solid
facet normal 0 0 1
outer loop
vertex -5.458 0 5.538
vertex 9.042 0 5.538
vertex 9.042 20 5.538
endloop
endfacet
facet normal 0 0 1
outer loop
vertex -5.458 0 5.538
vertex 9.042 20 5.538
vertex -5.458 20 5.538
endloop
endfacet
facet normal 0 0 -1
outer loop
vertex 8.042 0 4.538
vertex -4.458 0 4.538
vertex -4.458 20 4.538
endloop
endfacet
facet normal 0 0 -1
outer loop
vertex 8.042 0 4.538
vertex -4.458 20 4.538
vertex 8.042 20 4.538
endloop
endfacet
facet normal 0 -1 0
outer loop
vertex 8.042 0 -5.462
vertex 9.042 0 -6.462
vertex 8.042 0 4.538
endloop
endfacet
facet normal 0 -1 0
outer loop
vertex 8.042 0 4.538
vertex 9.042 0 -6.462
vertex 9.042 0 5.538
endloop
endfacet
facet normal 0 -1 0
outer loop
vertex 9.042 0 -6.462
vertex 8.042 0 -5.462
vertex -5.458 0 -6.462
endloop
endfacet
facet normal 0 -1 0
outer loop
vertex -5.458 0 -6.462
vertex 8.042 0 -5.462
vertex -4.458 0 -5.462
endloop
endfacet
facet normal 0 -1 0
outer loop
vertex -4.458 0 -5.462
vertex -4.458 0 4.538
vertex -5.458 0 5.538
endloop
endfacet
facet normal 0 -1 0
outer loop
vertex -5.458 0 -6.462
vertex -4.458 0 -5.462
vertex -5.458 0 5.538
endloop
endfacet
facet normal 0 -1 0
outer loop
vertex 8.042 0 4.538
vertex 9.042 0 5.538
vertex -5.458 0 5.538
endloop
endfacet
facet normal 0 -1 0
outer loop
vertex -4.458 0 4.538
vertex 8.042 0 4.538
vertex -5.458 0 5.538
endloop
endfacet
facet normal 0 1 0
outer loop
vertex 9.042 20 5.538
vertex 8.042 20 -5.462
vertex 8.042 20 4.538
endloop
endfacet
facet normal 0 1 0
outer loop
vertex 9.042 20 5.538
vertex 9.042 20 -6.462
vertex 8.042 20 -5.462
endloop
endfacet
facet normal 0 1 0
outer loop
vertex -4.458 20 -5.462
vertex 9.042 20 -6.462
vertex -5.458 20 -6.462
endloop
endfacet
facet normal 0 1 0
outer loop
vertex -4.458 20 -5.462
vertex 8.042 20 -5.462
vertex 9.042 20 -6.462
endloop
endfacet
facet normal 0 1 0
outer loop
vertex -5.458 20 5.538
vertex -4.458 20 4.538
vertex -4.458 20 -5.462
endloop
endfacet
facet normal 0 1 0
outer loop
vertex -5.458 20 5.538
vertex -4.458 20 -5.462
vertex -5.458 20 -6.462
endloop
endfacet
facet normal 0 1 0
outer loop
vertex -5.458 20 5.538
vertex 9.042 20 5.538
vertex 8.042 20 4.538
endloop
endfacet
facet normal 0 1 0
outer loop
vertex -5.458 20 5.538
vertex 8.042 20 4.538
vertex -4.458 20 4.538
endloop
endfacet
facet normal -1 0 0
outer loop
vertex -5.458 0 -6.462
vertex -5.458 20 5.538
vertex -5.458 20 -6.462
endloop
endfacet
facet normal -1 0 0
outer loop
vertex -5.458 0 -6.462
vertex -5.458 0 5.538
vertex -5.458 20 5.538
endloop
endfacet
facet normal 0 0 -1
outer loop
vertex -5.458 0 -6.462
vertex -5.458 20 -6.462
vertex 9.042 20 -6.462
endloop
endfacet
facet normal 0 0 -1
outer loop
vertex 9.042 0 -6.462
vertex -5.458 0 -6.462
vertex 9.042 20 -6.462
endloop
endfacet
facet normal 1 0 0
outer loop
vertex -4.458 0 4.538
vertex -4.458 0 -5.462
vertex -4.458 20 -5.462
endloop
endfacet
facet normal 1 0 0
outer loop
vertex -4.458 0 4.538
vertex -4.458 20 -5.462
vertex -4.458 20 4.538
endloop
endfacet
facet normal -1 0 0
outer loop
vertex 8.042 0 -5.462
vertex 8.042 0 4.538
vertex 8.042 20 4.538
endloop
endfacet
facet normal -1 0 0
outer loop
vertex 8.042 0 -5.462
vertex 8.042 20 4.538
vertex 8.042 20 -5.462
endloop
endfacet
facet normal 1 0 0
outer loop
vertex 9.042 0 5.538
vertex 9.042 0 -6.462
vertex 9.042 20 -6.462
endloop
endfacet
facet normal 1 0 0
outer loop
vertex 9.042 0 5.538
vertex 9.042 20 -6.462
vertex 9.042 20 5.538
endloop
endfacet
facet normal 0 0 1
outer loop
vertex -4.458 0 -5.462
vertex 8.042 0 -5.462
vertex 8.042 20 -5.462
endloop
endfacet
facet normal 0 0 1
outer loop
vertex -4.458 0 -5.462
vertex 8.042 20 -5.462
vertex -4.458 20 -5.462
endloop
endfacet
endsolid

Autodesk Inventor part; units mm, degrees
ref_plane "YZ Plane" through (0, 0, 0) normal (1, 0, 0) x (0, 1, 0)
ref_plane "XZ Plane" through (0, 0, 0) normal (0, 1, 0) x (-1, 0, 0)
ref_plane "XY Plane" through (0, 0, 0) normal (0, 0, 1) x (1, 0, 0)
sketch "草圖1" plane through (0, 0, 0) normal (0, 1, 0) x (-1, 0, 0)
  line L0 (4.4578, 4.5382) -> (-8.0422, 4.5382)
  line L1 (-8.0422, 4.5382) -> (-8.0422, -5.4618)
  line L2 (-8.0422, -5.4618) -> (4.4578, -5.4618)
  line L3 (4.4578, -5.4618) -> (4.4578, 4.5382)
  line L4 (5.4578, -6.4618) -> (-9.0422, -6.4618)
  line L5 (-9.0422, -6.4618) -> (-9.0422, 5.5382)
  line L6 (-9.0422, 5.5382) -> (5.4578, 5.5382)
  line L7 (5.4578, 5.5382) -> (5.4578, -6.4618)
  point P0 (0, 0)
  dimension "d0" = 10
  dimension "d1" = 12.5
  dimension "d2" = 1
extrude "擠出1" add sketch "草圖1" along normal blind 20
properties part number "axis_rf_fix"
